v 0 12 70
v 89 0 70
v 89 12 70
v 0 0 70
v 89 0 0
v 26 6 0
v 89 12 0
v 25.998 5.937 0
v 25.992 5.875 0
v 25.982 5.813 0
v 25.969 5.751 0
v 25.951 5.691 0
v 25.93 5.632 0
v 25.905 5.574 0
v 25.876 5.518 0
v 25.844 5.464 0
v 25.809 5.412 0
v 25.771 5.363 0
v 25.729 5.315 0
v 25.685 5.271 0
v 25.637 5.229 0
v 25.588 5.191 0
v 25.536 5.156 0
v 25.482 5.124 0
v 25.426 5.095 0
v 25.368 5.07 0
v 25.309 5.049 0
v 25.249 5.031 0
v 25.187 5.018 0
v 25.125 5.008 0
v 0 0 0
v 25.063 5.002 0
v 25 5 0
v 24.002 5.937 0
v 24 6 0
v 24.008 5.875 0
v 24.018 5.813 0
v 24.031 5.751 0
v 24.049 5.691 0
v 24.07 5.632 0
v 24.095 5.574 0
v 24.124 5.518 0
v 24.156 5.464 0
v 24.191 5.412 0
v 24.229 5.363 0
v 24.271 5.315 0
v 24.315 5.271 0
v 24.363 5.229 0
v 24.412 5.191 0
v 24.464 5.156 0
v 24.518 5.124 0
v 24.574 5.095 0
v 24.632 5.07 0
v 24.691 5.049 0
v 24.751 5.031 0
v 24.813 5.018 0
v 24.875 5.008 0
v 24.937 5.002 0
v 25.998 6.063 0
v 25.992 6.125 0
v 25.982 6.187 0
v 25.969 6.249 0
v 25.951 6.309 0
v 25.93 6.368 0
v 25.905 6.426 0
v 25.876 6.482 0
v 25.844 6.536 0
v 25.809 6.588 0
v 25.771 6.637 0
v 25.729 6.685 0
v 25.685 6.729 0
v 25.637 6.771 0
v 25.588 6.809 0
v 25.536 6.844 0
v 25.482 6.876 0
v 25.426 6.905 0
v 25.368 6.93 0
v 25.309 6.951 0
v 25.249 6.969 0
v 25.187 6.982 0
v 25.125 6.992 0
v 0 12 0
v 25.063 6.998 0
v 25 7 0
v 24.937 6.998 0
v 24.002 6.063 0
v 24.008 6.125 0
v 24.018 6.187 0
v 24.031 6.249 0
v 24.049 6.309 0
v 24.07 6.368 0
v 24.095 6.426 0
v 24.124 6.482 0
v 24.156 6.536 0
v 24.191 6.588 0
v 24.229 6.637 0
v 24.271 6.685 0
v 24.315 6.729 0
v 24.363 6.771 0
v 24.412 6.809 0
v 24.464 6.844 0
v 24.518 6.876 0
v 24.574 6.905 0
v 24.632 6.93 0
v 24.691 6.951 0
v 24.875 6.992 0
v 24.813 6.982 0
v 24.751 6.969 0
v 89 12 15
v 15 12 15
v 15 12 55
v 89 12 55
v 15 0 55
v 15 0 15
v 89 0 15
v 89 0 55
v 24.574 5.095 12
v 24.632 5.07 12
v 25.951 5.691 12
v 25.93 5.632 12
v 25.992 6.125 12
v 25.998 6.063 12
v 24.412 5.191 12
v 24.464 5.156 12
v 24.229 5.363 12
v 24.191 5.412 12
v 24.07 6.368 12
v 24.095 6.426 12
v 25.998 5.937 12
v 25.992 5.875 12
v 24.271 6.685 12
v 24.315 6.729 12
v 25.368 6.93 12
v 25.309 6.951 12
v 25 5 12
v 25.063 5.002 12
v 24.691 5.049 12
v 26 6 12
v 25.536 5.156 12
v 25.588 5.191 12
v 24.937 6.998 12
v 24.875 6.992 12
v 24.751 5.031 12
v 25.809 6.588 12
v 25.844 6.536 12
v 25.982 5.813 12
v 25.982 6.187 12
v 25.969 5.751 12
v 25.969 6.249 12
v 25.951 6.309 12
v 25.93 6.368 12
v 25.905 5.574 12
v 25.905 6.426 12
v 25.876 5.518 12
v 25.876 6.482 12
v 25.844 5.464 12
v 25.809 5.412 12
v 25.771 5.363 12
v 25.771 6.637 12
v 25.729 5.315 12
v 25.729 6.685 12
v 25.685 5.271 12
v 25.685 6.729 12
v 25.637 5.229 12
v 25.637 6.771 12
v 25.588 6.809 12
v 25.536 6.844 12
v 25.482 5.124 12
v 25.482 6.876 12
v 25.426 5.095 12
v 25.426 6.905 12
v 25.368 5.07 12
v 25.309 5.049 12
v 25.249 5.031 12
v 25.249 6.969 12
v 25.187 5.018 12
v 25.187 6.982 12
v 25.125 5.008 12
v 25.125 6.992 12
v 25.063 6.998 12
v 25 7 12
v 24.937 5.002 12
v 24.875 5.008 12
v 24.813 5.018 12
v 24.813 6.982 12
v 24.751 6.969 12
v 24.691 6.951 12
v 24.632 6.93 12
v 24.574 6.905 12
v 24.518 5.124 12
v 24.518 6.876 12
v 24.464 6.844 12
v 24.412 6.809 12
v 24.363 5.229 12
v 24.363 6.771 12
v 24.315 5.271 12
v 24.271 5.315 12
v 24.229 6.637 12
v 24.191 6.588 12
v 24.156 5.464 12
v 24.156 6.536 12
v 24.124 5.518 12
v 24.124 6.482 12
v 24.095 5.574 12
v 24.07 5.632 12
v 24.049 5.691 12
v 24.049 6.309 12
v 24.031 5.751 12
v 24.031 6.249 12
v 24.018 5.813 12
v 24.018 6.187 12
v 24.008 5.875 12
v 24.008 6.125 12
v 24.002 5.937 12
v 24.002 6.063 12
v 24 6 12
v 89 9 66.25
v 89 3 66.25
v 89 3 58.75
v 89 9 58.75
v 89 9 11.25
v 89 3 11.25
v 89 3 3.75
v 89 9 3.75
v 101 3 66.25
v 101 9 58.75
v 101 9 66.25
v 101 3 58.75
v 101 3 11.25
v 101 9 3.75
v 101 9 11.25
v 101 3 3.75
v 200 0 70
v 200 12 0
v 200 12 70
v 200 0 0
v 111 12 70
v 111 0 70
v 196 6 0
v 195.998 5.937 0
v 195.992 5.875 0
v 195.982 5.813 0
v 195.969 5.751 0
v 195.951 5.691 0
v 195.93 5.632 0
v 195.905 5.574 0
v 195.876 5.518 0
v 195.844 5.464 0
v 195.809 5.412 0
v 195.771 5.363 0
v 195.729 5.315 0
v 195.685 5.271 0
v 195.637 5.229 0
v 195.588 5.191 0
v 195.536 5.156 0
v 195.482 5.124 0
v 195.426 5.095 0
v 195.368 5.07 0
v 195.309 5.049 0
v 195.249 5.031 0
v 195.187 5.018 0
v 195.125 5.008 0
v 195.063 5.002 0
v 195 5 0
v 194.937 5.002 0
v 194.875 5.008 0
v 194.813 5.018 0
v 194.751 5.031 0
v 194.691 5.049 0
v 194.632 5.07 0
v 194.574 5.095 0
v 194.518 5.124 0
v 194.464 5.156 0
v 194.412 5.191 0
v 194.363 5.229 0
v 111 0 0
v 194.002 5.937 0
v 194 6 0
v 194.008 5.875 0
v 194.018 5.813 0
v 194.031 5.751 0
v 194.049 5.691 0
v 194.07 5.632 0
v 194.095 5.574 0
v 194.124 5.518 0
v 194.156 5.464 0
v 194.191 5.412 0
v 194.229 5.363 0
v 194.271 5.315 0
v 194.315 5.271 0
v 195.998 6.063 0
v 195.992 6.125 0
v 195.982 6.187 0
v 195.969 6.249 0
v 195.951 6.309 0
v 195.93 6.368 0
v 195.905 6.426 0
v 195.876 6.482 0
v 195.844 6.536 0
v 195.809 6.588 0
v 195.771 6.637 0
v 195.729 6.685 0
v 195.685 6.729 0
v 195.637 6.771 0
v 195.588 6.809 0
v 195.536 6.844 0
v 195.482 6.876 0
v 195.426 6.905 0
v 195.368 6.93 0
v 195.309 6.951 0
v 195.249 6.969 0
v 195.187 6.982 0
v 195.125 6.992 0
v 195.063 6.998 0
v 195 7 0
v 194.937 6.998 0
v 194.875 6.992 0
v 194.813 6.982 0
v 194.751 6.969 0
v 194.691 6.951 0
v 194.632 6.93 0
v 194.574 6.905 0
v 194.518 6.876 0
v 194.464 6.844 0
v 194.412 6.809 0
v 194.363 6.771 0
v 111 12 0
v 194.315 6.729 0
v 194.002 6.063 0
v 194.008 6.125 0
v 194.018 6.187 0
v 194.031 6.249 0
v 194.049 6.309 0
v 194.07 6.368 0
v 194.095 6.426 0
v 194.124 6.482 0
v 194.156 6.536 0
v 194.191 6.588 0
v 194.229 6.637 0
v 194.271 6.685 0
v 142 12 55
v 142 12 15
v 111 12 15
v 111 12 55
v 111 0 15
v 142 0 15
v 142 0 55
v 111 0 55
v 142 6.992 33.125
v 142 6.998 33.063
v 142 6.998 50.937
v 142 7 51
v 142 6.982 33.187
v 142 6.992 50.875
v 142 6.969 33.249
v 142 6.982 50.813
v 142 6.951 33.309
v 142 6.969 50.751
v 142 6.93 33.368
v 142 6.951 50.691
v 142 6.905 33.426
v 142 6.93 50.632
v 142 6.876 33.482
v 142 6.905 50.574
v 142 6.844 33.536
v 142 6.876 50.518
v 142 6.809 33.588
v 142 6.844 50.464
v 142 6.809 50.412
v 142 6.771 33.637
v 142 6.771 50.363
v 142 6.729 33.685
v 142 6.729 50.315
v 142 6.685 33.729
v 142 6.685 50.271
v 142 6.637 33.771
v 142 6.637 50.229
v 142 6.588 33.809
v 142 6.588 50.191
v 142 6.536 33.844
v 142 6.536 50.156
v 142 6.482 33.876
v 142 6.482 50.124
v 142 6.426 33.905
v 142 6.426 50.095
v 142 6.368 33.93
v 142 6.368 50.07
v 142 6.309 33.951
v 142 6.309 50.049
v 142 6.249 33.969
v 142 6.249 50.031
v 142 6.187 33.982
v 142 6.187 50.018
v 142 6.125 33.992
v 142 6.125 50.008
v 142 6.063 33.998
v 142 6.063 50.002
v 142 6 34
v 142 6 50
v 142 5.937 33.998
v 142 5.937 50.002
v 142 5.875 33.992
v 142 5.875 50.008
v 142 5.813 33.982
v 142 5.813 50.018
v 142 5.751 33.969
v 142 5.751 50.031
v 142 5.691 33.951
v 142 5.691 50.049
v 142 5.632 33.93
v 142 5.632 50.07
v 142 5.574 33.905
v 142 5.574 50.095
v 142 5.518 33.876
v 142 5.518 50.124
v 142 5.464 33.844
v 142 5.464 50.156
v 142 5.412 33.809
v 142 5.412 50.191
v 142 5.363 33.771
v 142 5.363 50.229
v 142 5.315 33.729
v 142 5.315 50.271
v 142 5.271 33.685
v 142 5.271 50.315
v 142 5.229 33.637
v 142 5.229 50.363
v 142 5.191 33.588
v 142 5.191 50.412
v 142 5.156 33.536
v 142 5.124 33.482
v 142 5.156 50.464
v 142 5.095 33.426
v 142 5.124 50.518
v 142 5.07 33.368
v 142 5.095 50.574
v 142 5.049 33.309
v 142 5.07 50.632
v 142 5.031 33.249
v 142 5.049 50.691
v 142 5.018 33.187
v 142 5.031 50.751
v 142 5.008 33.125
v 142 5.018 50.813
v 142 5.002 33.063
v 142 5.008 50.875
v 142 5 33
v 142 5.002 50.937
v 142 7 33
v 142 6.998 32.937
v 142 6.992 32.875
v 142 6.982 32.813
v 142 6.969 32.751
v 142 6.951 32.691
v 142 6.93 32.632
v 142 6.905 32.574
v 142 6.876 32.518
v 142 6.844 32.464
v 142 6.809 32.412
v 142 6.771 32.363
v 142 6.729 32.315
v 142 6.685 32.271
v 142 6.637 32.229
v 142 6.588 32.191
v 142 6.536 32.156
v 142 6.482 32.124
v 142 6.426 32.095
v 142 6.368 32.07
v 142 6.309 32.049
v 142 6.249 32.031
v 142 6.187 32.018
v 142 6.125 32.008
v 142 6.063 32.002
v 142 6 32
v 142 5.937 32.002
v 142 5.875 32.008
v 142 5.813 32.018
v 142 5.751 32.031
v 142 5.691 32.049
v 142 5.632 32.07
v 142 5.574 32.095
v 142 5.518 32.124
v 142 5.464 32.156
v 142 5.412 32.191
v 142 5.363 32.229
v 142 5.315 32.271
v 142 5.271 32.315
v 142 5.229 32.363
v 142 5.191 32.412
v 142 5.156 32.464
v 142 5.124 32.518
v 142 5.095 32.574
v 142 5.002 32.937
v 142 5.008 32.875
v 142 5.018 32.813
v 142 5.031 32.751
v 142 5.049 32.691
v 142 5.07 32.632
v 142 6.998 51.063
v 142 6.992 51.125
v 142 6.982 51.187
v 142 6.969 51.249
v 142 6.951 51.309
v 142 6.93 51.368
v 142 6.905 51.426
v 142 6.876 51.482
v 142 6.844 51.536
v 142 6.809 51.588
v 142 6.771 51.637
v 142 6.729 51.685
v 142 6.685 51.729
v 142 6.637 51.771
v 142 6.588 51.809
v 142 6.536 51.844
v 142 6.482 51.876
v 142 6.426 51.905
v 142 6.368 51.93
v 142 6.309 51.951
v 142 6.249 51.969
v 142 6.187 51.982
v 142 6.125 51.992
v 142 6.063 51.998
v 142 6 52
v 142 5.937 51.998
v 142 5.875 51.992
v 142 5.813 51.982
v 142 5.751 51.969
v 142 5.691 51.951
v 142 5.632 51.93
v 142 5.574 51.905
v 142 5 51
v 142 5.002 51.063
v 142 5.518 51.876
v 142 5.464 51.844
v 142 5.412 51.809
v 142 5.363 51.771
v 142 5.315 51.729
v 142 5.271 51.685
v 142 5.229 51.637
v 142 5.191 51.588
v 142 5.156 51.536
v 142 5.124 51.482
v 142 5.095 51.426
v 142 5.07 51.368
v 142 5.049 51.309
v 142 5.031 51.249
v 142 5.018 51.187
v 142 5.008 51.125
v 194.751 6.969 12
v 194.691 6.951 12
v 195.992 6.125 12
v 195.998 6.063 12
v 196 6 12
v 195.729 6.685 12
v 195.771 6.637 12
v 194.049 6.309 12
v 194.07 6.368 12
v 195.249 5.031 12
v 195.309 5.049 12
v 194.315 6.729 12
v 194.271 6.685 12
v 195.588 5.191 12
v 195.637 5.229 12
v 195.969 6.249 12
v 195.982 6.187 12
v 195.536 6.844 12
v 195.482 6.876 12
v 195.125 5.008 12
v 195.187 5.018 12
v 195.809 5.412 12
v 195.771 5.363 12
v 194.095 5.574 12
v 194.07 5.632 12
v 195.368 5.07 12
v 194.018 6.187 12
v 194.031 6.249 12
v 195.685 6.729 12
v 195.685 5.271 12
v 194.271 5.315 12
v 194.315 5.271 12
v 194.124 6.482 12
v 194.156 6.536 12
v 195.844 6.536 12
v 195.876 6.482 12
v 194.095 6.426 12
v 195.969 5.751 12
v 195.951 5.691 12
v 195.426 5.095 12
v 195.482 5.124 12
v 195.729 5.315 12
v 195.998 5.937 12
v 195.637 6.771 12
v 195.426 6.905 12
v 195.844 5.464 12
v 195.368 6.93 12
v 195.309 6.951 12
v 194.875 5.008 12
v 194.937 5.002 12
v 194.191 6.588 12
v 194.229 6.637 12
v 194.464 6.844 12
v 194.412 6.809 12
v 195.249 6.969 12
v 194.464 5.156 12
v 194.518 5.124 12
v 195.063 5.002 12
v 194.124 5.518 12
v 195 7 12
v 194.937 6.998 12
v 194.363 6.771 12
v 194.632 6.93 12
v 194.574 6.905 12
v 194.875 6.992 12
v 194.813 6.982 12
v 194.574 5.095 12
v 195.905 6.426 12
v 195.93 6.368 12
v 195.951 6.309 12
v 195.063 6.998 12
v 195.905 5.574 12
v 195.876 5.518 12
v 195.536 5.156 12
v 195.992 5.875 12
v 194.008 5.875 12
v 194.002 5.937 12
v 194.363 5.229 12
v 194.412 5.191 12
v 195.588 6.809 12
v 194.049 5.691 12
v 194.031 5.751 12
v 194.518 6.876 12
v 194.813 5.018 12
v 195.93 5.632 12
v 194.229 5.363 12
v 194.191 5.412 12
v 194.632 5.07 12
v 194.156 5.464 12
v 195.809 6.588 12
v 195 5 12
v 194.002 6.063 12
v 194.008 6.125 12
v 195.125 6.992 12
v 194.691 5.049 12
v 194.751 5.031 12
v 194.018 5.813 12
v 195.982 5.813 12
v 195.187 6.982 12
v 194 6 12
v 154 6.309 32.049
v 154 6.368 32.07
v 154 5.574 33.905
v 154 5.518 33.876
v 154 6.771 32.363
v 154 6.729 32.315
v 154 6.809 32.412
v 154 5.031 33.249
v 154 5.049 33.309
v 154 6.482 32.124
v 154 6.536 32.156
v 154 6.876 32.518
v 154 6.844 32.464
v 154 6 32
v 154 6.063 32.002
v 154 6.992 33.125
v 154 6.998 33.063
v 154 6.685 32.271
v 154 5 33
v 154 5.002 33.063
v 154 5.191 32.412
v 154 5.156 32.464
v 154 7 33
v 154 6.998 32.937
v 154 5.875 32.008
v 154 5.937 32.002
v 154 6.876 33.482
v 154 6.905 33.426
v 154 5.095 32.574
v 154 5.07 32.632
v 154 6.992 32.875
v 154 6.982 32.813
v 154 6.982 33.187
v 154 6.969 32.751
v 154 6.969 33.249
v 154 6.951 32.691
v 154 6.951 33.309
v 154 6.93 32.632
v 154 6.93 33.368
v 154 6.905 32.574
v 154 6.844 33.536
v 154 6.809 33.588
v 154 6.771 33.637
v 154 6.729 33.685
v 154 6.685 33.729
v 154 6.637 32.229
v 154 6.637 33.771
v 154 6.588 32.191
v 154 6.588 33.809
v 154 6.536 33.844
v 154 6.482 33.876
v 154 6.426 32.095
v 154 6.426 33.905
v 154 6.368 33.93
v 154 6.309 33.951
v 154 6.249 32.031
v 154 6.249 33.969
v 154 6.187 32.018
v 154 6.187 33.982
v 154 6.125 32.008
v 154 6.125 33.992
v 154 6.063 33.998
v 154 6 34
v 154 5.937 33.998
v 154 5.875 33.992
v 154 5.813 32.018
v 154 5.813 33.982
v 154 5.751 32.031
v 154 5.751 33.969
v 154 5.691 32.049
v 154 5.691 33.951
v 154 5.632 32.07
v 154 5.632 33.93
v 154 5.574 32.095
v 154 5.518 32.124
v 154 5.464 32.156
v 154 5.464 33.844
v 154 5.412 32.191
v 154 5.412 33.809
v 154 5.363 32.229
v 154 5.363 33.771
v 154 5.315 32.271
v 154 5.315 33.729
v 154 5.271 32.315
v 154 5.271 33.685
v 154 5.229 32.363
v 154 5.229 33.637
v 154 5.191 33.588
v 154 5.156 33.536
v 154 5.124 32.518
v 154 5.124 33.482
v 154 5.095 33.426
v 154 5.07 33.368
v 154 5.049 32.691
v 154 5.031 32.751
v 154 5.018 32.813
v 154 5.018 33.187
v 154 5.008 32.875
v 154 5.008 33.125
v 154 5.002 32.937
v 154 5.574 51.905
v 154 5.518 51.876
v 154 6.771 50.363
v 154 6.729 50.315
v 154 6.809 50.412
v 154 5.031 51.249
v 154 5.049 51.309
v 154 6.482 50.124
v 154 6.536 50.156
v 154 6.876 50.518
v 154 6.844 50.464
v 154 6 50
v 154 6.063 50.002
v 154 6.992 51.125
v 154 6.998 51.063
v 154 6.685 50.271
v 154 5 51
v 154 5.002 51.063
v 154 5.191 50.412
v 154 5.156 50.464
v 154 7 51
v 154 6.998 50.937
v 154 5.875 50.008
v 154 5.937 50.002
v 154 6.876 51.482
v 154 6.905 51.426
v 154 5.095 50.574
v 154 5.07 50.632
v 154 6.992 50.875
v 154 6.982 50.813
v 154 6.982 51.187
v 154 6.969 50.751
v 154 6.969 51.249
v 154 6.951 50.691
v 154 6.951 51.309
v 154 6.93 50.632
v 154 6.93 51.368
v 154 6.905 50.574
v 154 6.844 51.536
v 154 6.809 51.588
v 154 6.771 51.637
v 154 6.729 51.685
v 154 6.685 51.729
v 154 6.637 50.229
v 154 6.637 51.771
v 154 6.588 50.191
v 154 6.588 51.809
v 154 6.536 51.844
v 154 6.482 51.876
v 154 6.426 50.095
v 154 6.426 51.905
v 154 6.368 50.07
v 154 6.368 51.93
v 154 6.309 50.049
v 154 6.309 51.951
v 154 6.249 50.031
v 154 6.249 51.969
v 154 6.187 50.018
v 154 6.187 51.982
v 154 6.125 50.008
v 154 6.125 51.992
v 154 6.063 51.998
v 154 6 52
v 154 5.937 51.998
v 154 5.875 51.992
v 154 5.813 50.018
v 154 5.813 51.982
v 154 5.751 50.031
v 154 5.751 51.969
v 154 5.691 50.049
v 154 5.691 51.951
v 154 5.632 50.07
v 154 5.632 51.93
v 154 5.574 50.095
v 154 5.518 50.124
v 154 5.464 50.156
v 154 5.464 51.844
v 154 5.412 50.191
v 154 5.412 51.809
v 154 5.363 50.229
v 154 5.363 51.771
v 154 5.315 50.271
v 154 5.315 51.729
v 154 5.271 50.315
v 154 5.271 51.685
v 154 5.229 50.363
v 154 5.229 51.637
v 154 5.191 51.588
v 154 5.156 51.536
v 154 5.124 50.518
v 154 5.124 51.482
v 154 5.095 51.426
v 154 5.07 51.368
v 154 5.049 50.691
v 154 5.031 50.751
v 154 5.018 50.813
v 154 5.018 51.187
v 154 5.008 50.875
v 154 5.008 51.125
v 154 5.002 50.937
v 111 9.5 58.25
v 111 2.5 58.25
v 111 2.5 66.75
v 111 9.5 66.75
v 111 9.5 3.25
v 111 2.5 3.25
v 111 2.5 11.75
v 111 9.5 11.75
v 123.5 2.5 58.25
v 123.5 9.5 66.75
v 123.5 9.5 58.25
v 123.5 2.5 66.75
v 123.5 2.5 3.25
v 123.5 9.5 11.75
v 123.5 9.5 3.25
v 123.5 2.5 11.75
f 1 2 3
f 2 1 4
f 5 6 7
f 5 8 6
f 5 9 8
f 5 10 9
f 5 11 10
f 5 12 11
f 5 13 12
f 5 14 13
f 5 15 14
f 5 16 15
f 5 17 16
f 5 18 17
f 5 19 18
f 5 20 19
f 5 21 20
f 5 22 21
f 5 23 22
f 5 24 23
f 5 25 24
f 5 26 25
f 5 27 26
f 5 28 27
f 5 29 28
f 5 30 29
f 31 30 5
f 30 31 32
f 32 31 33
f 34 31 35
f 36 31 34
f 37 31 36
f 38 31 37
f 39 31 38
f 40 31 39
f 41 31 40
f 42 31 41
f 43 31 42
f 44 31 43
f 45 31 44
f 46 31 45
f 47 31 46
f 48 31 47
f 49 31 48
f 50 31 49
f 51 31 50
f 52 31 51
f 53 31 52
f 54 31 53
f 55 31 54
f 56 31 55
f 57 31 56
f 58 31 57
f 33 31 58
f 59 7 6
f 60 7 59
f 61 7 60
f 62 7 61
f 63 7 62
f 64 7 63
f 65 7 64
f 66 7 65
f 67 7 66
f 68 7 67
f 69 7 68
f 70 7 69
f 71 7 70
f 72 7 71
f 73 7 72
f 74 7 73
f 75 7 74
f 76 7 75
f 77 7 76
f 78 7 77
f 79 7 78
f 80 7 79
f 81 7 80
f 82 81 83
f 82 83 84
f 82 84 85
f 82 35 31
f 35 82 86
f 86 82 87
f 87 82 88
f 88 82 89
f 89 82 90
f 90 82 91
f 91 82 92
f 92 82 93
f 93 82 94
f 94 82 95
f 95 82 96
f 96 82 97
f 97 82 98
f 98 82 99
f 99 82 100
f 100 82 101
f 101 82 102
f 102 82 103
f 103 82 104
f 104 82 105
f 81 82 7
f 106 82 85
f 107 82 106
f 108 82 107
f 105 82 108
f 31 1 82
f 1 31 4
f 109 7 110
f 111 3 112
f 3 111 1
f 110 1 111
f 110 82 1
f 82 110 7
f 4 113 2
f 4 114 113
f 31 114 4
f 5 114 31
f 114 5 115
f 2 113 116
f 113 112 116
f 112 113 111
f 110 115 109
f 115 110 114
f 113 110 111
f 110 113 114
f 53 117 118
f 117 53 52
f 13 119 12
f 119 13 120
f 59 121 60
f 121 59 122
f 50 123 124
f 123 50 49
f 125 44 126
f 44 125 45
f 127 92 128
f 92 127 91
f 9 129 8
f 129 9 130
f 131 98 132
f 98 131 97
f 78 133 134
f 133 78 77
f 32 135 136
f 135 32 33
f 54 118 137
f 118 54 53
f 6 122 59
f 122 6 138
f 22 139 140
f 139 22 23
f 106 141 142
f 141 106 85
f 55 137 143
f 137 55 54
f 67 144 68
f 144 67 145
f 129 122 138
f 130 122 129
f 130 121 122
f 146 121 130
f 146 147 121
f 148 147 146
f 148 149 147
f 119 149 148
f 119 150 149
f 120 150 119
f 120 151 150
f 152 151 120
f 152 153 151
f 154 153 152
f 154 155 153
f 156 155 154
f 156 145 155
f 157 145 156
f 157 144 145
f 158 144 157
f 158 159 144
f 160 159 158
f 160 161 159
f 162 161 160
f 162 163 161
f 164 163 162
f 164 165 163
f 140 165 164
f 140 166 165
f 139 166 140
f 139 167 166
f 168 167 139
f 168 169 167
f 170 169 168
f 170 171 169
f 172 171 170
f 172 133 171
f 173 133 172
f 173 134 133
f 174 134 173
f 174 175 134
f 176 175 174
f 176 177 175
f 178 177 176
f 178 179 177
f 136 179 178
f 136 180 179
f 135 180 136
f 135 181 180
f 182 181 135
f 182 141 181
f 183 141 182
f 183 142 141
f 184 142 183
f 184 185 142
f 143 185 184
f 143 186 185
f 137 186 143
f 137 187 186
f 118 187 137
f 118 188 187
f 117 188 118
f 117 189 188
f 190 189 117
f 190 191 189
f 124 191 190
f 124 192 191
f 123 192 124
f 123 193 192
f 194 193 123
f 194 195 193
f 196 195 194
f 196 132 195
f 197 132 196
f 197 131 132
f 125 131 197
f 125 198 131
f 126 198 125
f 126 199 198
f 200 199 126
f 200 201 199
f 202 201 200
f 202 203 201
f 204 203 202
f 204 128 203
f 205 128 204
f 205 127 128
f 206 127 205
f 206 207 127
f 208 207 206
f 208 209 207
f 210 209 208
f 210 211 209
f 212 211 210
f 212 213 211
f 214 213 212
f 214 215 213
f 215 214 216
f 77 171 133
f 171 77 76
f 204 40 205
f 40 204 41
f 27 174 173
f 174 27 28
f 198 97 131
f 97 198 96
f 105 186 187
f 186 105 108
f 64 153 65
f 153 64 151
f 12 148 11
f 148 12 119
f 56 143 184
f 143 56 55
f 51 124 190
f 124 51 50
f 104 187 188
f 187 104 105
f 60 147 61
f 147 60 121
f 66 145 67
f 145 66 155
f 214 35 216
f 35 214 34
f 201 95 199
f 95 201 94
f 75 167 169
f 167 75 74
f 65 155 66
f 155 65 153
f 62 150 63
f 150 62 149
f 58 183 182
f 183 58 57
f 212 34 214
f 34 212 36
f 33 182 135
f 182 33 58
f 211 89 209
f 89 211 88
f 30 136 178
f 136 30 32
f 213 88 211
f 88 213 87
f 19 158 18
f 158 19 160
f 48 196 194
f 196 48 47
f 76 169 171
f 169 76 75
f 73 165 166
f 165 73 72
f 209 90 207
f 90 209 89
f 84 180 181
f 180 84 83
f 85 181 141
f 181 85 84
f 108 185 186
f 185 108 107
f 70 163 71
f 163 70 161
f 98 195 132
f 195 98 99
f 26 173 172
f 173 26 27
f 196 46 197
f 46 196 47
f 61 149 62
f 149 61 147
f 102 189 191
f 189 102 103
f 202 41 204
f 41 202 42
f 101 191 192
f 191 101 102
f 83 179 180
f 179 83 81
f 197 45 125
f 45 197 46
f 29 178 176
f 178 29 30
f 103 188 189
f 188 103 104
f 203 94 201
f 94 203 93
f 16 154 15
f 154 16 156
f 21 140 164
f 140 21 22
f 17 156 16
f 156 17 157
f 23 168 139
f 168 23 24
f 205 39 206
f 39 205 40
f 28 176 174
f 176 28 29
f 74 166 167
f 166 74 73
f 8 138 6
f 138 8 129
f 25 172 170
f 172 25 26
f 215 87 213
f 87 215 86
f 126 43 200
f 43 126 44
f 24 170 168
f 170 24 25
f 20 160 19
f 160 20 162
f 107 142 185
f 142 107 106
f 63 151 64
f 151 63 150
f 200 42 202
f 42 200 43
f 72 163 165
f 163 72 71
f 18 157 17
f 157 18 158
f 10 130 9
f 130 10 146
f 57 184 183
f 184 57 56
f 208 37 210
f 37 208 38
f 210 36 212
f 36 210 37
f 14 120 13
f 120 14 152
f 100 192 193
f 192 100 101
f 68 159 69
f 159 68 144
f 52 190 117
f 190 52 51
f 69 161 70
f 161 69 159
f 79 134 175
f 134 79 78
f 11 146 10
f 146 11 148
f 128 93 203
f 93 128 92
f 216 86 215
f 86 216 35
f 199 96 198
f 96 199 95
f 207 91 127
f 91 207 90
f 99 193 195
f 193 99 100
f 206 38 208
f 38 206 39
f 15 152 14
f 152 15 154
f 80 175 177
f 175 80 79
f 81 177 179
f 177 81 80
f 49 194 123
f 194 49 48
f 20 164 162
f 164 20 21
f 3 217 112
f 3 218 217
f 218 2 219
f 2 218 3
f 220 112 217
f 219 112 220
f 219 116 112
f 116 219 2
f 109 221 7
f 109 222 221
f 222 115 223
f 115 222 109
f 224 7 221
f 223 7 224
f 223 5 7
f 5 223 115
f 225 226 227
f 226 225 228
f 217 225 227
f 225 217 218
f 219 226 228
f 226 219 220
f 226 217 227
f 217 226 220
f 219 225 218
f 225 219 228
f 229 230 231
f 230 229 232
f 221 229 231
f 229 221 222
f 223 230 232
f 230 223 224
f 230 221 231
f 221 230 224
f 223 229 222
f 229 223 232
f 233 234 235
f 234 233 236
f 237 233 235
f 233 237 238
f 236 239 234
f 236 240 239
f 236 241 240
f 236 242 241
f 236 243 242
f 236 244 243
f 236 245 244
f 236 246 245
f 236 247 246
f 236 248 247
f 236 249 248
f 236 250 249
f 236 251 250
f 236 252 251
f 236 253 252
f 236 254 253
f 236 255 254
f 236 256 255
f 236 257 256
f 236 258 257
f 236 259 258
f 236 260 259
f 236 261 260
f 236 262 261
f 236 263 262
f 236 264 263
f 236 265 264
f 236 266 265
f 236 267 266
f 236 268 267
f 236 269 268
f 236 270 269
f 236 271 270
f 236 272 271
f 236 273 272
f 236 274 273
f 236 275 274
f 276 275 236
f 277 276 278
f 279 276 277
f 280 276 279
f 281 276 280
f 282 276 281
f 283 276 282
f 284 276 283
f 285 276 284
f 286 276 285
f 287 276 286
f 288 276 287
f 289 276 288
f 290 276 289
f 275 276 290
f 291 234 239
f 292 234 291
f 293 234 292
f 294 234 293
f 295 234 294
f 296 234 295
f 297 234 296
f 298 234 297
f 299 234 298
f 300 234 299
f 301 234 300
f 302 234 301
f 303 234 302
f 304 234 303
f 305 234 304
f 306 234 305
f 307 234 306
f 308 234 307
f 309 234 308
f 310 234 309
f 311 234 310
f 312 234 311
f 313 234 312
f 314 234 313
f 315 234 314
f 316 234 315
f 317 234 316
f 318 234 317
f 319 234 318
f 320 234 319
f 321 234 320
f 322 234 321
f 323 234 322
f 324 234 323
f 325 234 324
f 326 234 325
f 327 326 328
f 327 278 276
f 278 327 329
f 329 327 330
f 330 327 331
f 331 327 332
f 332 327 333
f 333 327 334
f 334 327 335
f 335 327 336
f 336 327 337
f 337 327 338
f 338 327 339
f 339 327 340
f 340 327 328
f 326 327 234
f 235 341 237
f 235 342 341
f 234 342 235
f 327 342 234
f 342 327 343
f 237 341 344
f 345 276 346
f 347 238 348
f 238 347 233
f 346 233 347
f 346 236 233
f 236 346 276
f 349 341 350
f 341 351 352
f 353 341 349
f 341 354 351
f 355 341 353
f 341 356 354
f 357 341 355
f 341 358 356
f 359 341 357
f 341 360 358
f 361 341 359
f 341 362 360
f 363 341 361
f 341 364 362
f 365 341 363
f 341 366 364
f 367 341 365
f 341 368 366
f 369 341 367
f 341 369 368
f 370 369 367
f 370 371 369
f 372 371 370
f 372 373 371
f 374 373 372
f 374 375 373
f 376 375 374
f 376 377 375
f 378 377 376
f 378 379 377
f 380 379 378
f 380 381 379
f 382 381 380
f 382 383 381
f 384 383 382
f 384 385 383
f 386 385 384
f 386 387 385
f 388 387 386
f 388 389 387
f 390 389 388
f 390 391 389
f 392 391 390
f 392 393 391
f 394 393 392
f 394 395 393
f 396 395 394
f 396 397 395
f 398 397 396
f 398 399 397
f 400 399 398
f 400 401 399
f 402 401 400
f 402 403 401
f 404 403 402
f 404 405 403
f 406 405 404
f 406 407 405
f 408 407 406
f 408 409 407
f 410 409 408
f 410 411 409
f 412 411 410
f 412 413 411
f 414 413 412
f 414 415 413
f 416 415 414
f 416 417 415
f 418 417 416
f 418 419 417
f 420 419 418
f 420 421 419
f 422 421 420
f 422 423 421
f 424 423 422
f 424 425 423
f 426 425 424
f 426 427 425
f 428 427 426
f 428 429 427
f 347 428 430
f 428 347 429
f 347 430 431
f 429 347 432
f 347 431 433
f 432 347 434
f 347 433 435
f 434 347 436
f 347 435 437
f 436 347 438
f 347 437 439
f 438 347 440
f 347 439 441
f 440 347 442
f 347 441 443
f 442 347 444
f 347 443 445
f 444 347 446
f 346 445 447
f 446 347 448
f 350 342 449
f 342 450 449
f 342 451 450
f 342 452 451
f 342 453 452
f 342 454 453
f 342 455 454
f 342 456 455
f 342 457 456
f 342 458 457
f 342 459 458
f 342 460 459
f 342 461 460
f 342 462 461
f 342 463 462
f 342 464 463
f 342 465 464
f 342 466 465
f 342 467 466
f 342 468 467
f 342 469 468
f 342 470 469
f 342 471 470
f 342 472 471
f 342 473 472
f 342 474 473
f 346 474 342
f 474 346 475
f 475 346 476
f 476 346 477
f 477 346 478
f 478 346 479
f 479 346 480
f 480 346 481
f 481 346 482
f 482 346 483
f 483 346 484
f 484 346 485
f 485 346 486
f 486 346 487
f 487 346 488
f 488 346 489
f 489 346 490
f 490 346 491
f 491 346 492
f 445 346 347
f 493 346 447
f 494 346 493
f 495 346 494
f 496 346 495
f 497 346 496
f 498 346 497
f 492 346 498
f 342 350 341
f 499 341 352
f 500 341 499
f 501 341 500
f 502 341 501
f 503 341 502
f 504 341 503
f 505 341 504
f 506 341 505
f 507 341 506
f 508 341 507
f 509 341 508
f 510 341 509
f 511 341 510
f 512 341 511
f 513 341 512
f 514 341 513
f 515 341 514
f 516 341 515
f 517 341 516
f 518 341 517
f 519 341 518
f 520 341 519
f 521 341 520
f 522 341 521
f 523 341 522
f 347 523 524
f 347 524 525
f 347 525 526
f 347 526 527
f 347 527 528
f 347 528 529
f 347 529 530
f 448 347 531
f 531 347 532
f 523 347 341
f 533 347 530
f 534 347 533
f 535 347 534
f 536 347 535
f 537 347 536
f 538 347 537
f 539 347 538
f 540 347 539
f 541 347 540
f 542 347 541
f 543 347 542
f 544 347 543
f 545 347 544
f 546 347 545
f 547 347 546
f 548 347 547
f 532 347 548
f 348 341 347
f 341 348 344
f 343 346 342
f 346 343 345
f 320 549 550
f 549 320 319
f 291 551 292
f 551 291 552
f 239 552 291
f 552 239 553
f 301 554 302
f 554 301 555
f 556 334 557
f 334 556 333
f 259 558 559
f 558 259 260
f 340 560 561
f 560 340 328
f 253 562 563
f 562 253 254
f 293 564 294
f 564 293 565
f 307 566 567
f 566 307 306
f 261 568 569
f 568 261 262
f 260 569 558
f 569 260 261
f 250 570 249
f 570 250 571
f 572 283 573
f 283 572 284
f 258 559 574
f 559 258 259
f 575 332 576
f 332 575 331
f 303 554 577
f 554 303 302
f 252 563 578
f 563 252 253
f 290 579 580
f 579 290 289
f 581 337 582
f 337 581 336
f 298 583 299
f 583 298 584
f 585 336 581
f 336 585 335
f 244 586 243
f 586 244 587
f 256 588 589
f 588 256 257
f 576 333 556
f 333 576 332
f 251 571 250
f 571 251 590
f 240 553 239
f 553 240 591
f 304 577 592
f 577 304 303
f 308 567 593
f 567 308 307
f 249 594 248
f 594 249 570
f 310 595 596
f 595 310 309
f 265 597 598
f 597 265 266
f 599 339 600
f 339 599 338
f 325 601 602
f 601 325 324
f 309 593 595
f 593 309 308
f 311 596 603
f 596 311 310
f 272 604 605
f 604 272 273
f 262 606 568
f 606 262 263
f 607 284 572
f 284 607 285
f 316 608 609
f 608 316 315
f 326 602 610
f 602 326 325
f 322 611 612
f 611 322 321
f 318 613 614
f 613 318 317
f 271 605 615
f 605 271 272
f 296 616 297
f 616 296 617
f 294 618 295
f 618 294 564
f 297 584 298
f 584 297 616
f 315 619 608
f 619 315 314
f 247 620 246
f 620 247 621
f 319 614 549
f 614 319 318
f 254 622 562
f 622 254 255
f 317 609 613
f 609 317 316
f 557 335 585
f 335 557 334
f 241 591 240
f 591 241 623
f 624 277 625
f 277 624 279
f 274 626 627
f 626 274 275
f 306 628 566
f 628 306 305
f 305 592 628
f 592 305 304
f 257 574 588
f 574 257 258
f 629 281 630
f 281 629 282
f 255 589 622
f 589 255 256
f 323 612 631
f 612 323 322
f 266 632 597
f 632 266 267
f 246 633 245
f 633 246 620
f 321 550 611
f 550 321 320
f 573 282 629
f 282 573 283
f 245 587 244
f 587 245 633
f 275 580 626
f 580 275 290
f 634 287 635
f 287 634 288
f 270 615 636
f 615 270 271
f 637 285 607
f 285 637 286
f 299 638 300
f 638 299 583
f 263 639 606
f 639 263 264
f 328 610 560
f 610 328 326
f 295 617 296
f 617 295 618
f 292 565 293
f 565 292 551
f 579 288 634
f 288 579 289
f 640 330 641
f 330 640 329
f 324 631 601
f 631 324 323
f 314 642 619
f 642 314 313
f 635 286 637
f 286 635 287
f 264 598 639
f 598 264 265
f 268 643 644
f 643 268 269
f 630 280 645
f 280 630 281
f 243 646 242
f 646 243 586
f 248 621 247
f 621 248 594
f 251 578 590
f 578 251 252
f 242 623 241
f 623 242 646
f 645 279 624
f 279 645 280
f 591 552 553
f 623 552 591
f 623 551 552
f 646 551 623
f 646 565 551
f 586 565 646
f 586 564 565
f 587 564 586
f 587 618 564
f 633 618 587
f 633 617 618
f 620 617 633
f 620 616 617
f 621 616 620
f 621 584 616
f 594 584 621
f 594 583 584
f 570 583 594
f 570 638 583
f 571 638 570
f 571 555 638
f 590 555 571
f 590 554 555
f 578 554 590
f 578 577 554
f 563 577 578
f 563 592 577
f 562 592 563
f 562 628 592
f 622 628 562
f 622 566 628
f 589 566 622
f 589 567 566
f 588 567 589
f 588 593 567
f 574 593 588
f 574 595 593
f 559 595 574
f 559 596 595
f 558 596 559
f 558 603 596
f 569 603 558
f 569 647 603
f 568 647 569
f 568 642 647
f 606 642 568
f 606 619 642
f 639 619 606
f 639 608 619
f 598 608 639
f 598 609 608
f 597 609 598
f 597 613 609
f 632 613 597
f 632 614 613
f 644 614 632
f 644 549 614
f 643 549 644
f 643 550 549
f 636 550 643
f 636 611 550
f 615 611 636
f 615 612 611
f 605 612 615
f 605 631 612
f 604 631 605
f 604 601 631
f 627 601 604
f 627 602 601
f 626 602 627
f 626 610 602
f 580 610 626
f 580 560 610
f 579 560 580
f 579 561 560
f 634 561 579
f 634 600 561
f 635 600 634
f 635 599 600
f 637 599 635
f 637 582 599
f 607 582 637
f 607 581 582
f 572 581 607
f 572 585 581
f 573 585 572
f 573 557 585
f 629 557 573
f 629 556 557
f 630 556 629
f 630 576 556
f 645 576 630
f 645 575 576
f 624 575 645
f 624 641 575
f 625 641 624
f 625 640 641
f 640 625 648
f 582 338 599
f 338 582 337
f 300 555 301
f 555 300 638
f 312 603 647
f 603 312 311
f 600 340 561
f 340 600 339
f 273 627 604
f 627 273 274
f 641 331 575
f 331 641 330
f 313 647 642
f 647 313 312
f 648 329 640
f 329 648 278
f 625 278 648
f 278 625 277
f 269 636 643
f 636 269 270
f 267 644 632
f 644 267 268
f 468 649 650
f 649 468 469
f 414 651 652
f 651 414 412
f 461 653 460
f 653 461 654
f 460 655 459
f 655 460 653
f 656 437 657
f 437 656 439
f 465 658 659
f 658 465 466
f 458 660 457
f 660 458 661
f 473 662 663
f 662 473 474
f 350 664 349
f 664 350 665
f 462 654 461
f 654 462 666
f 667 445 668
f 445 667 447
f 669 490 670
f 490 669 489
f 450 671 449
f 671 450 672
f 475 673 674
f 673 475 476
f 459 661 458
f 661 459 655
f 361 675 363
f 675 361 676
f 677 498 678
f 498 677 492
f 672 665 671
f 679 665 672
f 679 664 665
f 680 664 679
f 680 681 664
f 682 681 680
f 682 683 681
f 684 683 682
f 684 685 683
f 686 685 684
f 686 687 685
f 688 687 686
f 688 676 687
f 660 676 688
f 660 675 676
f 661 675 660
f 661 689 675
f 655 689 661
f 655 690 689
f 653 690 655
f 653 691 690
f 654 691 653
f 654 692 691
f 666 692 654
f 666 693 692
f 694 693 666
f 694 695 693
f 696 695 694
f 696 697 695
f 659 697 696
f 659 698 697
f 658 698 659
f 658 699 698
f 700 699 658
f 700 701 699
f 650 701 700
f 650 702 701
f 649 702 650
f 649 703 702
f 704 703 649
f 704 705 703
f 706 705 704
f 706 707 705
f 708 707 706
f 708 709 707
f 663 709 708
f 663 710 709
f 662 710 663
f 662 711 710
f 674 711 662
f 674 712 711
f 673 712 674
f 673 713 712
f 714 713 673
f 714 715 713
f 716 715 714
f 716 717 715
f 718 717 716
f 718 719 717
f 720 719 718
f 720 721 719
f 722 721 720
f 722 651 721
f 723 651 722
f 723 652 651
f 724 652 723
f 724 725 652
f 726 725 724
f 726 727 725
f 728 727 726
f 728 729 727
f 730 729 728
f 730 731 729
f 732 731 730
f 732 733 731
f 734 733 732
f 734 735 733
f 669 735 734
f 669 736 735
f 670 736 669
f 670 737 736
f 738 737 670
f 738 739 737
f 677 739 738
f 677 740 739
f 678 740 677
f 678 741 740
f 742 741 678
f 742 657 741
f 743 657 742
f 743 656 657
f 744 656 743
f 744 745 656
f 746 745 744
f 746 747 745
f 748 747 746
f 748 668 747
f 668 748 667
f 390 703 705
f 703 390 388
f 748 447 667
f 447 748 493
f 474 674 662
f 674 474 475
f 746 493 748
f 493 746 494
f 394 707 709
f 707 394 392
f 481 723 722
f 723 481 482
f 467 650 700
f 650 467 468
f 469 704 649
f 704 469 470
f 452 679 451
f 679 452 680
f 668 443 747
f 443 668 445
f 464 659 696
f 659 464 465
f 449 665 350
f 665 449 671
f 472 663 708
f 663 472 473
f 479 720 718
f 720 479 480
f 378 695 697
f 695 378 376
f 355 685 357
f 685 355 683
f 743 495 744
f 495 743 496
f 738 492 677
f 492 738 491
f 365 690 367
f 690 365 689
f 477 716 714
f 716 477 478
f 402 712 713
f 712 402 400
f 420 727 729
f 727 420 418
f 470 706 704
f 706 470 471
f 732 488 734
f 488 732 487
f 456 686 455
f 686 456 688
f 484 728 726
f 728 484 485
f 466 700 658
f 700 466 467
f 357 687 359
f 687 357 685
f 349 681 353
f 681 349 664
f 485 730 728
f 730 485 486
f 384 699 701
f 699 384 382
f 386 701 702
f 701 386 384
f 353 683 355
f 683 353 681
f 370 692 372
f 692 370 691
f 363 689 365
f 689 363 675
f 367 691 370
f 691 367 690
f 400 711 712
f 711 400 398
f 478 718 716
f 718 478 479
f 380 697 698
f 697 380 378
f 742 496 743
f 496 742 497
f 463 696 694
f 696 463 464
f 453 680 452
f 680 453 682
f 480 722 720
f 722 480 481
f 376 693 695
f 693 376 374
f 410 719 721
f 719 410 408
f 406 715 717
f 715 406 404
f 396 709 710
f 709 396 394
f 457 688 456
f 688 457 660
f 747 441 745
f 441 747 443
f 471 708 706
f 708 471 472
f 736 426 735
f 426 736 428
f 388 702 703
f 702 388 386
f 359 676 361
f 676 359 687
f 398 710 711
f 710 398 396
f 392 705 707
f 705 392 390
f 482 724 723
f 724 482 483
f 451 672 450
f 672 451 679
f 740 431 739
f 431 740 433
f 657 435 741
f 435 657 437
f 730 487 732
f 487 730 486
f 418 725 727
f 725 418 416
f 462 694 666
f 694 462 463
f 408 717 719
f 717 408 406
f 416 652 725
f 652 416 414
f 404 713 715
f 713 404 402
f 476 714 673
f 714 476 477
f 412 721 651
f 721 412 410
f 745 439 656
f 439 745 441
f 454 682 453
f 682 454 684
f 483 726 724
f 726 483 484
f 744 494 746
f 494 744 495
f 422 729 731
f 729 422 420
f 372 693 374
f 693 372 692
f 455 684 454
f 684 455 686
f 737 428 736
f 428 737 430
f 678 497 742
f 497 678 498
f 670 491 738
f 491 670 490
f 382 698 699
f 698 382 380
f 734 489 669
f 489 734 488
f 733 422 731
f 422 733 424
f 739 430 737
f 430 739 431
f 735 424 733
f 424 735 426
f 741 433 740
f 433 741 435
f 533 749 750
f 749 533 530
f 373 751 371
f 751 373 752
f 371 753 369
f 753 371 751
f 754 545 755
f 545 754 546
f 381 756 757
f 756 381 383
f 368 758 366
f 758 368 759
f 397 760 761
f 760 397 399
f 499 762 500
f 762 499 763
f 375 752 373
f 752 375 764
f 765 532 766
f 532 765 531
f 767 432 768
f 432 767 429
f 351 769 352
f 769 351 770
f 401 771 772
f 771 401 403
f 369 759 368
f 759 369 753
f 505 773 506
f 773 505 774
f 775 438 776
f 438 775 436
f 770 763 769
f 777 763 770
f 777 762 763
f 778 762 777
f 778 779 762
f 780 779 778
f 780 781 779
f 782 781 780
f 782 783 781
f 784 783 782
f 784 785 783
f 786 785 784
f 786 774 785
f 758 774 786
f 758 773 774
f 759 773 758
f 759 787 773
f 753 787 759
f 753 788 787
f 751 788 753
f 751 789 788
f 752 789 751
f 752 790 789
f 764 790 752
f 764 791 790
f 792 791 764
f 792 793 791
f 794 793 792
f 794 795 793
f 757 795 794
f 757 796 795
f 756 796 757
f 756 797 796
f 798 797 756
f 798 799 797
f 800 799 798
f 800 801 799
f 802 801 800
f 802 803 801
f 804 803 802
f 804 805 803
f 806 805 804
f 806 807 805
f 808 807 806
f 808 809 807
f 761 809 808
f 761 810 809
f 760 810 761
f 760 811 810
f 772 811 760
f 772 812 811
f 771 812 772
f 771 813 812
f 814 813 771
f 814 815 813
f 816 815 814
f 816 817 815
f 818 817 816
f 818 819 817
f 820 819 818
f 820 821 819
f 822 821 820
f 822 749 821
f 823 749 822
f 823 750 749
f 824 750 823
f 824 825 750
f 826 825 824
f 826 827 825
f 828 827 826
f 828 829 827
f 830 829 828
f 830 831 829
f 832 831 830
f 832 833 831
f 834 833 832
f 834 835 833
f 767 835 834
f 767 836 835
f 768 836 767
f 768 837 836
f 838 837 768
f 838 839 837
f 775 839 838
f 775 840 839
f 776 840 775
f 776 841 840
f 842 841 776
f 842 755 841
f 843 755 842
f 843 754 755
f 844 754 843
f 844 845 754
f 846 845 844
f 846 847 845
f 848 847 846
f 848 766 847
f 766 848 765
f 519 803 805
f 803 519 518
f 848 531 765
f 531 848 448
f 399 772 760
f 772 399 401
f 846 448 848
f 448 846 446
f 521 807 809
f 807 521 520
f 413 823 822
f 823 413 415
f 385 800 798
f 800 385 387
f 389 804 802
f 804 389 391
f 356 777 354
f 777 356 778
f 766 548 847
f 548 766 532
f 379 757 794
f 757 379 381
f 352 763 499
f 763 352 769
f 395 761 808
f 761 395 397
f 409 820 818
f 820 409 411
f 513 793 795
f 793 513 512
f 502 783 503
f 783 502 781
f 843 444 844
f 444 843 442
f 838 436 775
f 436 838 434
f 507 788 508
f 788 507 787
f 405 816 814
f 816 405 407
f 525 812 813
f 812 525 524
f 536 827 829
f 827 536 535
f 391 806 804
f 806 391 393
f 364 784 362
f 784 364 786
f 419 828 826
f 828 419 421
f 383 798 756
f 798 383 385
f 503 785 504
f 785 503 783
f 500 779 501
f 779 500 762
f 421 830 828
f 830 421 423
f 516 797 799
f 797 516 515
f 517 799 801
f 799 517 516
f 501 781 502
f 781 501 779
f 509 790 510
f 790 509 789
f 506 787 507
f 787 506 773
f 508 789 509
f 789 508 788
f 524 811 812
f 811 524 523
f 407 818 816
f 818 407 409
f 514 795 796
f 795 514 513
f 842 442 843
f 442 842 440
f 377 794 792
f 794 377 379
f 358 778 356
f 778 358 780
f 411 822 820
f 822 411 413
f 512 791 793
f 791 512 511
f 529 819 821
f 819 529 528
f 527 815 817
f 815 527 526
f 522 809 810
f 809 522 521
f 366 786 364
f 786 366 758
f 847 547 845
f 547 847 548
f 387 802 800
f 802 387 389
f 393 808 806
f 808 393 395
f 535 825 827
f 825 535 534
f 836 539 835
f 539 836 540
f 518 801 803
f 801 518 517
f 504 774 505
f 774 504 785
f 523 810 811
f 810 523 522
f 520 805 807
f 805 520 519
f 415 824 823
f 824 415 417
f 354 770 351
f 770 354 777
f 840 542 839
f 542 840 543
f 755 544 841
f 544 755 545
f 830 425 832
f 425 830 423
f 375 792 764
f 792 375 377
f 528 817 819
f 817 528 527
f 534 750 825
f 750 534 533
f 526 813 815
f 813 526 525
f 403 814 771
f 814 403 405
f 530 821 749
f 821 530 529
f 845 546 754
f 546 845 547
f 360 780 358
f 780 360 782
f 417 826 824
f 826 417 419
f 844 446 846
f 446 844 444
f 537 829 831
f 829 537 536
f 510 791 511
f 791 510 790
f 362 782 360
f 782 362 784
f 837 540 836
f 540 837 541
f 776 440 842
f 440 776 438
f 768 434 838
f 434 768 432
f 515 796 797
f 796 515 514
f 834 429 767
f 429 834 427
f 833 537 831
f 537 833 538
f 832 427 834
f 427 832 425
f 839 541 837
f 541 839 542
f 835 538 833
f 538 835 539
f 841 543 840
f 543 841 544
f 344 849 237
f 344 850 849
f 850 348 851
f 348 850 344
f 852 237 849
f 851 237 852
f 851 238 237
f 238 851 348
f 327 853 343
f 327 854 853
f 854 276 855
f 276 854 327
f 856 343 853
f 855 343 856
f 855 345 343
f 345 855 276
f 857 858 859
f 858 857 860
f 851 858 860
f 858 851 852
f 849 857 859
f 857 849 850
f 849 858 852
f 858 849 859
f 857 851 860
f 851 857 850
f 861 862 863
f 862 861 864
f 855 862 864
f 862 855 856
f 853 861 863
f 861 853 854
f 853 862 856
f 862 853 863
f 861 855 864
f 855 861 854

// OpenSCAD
// Overall bracket dims
width = 178;
thickness = 12;
height = 70;

// Position of mounting holes, measured from nearest edge
mounting_hole_1 = 25;
mounting_hole_2 = width - 5;

// GPU dims
cooler_height = 15;     // Height above top of PCI bracket

// PCI dims
pci_length = 120;
pci_height = 40;
pci_edge = 15;
pci_thickness = 2;

// PCI mounting holes
pci_hole_1 = 18;
pci_hole_2 = 36;
pci_hole_in = 6;

// Screw hole size
hole_size = 2;          // Sized to fit 3mm self-tapping screw.
hole_depth = 12;

// Tolerance
tolerance = 0.5;

lower_height = height - cooler_height - pci_height;
$fn = 100;

module bracket_gen() {
    union() {
        difference() {
            cube([width, thickness, height]);
            translate([pci_edge, 0, cooler_height]) {
                cube([pci_length-pci_edge, thickness, pci_height]);
            }
            translate([mounting_hole_1, thickness/2, 0]) {
                cylinder(h = hole_depth, d = hole_size);
            }
            translate([mounting_hole_2, thickness/2, 0]) {
                cylinder(h = hole_depth, d = hole_size);
            }
            translate([pci_length, thickness - pci_hole_in, cooler_height + pci_hole_1]) {
                rotate([0, 90, 0]) {
                    cylinder(h = hole_depth, d = hole_size);
                }
            } 
            translate([pci_length, thickness - pci_hole_in, cooler_height + pci_hole_2]) {
                rotate([0, 90, 0]) {
                    cylinder(h = hole_depth, d = hole_size);
                }
            } 
        }
    }
}


/* creates a mask to split the bracket. Adds some mortice and tenon joints for gluing */
module bracket_mask(t = 0) {
    union() {
        cube([width/2, thickness, height]);
        translate([width/2, thickness/4 - t, height - 3*lower_height/4 - t]) {
            cube([thickness + t, thickness/2 + 2 * t, lower_height/2 + 2 * t]);
        }
        translate([width/2, thickness/4 - t, cooler_height/4 - t]) {
            cube([thickness + t, thickness/2 + 2 * t, cooler_height/2 + 2 * t]);
        }
    }
}

intersection() {
    bracket_gen();
    bracket_mask();
}

translate([thickness + 10, 0, 0]) { 
    difference() {
        bracket_gen();
        bracket_mask(t = tolerance);
    }
}
